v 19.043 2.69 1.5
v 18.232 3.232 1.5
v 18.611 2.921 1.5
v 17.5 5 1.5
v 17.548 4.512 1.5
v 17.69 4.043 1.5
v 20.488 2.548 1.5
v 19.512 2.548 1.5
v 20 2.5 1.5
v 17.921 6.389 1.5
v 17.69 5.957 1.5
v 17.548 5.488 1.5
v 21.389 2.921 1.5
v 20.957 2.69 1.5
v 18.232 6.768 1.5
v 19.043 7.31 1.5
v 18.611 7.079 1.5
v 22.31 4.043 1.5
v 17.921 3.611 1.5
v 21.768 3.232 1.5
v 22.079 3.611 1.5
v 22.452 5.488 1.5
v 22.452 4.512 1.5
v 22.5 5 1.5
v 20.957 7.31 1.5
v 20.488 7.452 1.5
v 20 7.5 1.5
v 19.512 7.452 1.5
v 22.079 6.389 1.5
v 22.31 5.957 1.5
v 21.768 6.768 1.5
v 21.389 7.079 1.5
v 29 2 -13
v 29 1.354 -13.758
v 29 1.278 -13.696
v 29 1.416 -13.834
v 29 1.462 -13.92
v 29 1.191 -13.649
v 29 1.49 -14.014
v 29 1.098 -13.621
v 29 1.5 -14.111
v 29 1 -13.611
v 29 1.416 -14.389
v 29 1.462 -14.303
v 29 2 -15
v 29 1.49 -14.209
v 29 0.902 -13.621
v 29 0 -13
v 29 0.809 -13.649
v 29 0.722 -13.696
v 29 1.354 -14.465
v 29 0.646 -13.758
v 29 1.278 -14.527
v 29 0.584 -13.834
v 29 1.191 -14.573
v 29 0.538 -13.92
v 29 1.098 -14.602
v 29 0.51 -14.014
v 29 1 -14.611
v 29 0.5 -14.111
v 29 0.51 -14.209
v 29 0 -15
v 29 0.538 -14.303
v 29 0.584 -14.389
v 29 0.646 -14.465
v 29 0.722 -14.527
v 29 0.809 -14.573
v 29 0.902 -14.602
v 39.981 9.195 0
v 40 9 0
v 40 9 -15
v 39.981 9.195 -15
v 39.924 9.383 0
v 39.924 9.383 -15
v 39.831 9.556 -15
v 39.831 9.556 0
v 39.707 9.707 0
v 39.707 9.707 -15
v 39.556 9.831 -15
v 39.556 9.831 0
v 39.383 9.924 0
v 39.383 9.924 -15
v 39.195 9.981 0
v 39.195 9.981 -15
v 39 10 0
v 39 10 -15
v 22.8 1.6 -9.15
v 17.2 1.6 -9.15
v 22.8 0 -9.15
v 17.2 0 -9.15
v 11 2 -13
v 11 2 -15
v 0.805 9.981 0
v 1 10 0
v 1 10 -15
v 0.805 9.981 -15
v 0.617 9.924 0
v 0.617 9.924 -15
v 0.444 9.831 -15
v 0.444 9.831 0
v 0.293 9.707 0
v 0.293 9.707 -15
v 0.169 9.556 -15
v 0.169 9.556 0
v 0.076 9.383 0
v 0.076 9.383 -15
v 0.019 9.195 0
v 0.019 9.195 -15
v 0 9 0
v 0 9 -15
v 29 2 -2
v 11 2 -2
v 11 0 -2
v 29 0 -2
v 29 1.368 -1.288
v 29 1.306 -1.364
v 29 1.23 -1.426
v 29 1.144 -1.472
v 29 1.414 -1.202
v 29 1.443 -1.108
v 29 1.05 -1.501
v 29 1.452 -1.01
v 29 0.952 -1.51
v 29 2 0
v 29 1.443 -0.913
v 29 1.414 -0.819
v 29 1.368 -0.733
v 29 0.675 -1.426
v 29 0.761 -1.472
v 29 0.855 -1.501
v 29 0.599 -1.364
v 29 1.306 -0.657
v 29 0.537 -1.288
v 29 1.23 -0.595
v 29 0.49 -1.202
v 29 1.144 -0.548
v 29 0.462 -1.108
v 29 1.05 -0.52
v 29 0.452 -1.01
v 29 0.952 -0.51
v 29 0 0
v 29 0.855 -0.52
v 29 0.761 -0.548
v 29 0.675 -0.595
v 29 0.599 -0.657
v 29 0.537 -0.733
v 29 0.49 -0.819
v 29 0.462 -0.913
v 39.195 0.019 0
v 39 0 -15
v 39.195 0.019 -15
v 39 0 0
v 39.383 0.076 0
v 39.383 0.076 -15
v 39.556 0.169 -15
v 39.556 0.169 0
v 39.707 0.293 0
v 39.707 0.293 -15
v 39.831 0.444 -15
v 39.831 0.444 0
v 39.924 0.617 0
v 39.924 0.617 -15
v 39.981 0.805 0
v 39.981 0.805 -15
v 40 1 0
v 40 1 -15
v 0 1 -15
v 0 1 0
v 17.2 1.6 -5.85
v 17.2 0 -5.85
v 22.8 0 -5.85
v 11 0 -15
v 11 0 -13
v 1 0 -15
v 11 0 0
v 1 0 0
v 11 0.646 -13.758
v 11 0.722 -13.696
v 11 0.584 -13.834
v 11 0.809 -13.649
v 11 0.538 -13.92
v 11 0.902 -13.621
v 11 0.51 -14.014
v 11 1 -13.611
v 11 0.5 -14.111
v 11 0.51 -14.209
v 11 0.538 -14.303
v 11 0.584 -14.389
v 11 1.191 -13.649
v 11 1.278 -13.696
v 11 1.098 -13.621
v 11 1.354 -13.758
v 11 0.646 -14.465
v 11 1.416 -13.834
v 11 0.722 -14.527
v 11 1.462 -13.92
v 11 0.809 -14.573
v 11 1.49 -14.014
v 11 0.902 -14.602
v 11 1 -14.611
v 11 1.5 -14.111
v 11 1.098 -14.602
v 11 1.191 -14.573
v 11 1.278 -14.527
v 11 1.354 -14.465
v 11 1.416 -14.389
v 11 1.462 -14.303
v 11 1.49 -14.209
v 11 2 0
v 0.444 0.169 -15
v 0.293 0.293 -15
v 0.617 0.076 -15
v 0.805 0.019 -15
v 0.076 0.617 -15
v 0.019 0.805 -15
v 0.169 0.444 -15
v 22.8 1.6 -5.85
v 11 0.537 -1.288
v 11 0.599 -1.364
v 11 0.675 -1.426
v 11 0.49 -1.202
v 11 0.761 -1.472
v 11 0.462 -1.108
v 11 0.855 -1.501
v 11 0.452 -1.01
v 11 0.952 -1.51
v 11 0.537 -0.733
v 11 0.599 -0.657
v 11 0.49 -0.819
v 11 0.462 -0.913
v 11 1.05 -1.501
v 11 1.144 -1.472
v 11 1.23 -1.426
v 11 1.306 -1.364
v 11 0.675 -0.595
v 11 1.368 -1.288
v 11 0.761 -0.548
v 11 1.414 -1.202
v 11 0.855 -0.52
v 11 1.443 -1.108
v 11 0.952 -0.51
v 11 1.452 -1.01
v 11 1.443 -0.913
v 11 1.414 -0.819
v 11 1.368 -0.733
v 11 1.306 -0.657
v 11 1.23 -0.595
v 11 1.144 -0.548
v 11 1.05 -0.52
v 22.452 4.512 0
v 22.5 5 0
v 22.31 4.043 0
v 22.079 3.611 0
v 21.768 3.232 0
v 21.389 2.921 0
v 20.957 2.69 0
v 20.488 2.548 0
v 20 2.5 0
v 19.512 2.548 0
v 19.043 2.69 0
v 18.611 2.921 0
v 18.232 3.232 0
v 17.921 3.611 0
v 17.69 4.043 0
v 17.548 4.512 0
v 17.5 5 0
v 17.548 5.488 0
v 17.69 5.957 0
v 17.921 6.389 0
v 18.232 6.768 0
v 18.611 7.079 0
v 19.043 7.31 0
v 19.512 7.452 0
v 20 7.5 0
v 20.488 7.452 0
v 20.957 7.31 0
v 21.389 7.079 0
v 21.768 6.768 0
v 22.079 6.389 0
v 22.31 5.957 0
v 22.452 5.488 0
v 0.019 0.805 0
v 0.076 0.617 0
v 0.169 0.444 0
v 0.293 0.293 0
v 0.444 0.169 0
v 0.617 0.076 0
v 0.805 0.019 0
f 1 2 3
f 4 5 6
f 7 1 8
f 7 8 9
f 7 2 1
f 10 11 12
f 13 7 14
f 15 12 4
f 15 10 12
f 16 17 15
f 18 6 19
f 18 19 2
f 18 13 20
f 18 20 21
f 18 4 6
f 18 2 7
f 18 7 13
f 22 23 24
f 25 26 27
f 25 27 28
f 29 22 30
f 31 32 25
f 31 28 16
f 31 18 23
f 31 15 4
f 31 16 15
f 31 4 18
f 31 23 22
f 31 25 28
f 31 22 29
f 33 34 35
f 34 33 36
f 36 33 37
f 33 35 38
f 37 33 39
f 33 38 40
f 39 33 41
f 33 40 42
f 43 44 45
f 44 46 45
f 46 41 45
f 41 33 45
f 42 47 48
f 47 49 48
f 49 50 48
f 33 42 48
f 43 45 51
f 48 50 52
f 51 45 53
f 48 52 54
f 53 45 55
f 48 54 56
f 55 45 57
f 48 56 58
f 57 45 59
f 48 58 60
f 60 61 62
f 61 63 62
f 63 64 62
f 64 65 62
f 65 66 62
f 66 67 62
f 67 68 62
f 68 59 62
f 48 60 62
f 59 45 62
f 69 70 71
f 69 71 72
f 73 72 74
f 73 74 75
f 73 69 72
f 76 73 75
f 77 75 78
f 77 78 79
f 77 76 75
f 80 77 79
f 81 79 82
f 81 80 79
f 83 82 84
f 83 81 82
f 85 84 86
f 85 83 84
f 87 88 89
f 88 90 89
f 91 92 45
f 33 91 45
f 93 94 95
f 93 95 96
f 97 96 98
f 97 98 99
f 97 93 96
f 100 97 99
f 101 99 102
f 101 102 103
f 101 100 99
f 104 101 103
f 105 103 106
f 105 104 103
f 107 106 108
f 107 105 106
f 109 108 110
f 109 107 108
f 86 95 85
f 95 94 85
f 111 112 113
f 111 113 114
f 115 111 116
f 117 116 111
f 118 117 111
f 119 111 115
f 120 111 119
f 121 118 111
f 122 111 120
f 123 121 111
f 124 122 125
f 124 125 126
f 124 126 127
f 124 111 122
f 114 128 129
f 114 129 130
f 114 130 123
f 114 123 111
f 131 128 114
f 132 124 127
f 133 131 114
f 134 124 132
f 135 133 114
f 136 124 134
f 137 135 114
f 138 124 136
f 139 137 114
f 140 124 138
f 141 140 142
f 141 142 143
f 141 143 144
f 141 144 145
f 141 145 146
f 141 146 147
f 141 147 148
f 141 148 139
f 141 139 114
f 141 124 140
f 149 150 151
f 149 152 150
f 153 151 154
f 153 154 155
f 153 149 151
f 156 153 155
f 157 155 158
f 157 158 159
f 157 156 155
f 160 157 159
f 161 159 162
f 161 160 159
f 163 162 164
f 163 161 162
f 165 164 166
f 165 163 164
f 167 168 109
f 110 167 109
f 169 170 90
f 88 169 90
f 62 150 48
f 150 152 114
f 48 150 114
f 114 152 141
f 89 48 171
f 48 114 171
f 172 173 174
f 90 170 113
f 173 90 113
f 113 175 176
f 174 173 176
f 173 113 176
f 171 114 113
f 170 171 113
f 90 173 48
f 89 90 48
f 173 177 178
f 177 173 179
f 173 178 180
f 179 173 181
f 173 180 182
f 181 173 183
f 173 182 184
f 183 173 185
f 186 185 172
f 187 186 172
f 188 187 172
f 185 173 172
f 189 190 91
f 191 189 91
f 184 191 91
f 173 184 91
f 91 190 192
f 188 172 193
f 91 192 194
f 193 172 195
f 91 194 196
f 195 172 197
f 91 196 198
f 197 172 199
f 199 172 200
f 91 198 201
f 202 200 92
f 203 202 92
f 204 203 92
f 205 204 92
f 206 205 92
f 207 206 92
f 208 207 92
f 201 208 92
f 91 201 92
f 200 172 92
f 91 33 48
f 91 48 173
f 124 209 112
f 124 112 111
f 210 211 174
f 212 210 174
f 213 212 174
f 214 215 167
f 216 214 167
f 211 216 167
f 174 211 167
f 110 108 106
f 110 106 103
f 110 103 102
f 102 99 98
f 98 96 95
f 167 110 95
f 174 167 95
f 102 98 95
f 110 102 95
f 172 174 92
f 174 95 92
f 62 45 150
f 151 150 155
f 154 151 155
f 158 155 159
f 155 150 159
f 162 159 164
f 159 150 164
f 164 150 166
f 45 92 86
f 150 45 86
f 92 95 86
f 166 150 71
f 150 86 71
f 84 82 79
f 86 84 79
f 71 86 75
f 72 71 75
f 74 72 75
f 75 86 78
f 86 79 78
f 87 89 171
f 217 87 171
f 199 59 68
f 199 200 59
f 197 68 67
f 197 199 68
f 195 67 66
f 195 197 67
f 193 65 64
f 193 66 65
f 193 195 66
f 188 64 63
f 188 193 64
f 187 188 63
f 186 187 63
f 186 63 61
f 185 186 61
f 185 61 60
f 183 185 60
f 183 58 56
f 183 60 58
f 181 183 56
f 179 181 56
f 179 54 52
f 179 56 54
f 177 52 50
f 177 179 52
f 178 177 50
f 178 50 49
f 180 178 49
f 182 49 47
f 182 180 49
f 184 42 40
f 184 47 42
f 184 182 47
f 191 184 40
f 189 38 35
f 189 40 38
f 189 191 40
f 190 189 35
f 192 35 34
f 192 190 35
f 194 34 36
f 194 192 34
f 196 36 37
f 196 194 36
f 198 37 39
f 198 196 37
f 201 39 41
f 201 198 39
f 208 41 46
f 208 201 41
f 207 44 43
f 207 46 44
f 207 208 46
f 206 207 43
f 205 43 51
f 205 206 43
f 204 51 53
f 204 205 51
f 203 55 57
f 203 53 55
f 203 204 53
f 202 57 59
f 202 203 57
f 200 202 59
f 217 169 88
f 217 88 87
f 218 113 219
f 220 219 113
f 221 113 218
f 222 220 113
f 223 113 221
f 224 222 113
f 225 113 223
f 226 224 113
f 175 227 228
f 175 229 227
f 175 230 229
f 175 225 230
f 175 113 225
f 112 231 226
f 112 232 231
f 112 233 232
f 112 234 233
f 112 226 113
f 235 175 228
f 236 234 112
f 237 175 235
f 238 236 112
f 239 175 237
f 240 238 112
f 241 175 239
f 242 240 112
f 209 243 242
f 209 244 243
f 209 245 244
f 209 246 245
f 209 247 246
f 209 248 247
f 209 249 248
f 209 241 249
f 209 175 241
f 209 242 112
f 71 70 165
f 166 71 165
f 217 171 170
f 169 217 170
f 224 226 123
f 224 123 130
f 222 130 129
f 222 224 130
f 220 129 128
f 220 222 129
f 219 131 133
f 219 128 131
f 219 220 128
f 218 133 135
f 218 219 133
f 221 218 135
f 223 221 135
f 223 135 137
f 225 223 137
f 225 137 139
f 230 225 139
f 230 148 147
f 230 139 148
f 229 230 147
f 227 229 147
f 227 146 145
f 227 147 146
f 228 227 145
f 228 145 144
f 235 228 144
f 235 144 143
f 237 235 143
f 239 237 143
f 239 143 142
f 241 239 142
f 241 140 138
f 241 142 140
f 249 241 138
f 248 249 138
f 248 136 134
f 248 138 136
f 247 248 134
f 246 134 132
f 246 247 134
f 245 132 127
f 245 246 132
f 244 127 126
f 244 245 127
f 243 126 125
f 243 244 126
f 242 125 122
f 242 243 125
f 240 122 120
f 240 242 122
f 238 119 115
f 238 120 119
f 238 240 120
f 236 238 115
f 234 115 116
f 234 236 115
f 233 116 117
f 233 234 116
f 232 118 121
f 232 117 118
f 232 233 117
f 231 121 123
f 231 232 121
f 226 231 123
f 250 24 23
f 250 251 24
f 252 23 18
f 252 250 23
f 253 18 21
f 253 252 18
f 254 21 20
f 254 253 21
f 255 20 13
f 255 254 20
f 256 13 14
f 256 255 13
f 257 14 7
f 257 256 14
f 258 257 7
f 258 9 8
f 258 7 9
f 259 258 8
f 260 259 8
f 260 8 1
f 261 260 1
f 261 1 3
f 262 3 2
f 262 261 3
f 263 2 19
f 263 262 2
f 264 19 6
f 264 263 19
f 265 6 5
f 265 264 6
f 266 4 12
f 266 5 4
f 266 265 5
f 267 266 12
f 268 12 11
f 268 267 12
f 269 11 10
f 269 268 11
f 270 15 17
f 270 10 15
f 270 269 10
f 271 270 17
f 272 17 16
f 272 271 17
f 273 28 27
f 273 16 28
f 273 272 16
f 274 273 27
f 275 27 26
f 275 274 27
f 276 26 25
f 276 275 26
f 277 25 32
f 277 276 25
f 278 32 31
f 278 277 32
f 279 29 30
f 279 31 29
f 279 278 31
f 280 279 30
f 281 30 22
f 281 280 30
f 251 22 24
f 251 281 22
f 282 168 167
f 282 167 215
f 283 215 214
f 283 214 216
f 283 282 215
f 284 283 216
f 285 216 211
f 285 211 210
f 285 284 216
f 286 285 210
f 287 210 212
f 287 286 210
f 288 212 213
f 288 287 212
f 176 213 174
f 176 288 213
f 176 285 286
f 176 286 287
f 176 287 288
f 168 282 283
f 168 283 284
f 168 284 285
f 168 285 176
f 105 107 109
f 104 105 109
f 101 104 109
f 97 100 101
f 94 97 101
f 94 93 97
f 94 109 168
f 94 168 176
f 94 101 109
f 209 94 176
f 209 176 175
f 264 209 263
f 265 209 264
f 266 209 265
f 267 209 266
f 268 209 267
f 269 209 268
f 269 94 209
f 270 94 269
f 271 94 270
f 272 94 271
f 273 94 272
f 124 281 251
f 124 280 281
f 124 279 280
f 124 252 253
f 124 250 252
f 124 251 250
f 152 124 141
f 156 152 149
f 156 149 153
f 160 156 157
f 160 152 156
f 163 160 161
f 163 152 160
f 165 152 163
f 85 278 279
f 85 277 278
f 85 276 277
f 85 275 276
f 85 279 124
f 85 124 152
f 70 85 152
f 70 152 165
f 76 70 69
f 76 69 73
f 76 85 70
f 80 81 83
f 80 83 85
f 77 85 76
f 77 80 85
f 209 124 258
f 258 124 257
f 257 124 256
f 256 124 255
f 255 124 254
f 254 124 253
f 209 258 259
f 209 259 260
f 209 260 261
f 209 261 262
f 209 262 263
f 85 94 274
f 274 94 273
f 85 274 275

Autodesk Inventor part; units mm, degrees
ref_plane "YZ Plane" through (0, 0, 0) normal (1, 0, 0) x (0, 1, 0)
ref_plane "XZ Plane" through (0, 0, 0) normal (0, 1, 0) x (-1, 0, 0)
ref_plane "XY Plane" through (0, 0, 0) normal (0, 0, 1) x (1, 0, 0)
sketch "Sketch1" plane through (0, 0, 0) normal (0, 0, 1) x (1, 0, 0)
  line L0 (0, 1) -> (0, 9)
  line L1 (1, 10) -> (39, 10)
  line L2 (40, 9) -> (40, 1)
  line L3 (39, 0) -> (1, 0)
  arc A0 (1, 10) -> (0, 9) centre (1, 9) ccw
  arc A1 (40, 9) -> (39, 10) centre (39, 9) ccw
  arc A2 (39, 0) -> (40, 1) centre (39, 1) ccw
  arc A3 (0, 1) -> (1, 0) centre (1, 1) ccw
  point P0 (0, 0)
  point P1 (0, 10)
  point P2 (40, 10)
  point P3 (40, 0)
  dimension "d0" = 10
  dimension "d1" = 40
  dimension "d4" = 1
extrude "Extrusion1" add sketch "Sketch1" against normal blind 15
sketch "Sketch2" plane through (1, 0, 0) normal (0, -1, 0) x (1, 0, 0)
  line L0 (0, 0) -> (38, 0) projected
  line L1 (0, 0) -> (0, -15) projected
  line L2 (38, -15) -> (0, -15) projected
  line L3 (38, 0) -> (38, -15) projected
  line L4 (0, 0) -> (38, 0) projected
  line L5 (0, 0) -> (0, -15) projected
  line L6 (38, -15) -> (0, -15) projected
  line L7 (38, 0) -> (38, -15) projected
  line L8 (0, 0) -> (38, 0) projected
  line L9 (38, -15) -> (0, -15) projected
  line L10 (0, 0) -> (0, -15) projected
  line L11 (38, 0) -> (38, -15) projected
  line L12 (16.2, -5.85) -> (16.2, -9.15)
  line L13 (16.2, -9.15) -> (21.8, -9.15)
  line L14 (21.8, -9.15) -> (21.8, -5.85)
  line L15 (21.8, -5.85) -> (16.2, -5.85)
  point P0 (-1, 0)
  point P1 (16.2, -7.5)
  dimension "d8" = 3.3
  dimension "d9" = 5.6
  dimension "d10" = 16.2
  dimension "d11" = 5.85
extrude "Extrusion2" cut sketch "Sketch2" against normal blind 1.6 contours L15 L14 L13 L12
sketch "Sketch3" plane through (0, 0, 0) normal (0, 0, 1) x (1, 0, 0)
  line L0 (40, 1) -> (40, 9) projected
  arc A0 (40, 9) -> (39, 10) centre (39, 9) ccw projected
  line L1 (39, 10) -> (1, 10) projected
  arc A1 (1, 10) -> (0, 9) centre (1, 9) ccw projected
  line L2 (0, 9) -> (0, 1) projected
  arc A2 (0, 1) -> (1, 0) centre (1, 1) ccw projected
  line L3 (1, 0) -> (39, 0) projected
  arc A3 (39, 0) -> (40, 1) centre (39, 1) ccw projected
  circle A4 centre (20, 5) radius 2.5
  point P0 (0, 0)
  dimension "d14" = 5
extrude "Extrusion3" add sketch "Sketch3" along normal blind 1.5 contours A4
sketch "Sketch4" plane through (0, 0, 0) normal (0, 0, 1) x (1, 0, 0)
  line L0 (17.2, 0) -> (22.8, 0) projected
  line L1 (20, 0) -> (11, 0)
  line L2 (1, 0) -> (39, 0) projected
  line L3 (11, 0) -> (11, 2)
  line L4 (11, 2) -> (29, 2)
  line L5 (29, 2) -> (29, 0)
  line L6 (29, 0) -> (20, 0)
  point P0 (0, 0)
  point P1 (29, 0)
  dimension "d17" = 9
  dimension "d18" = 2
  dimension "d19" = 18
extrude "Extrusion4" cut sketch "Sketch4" against normal blind 2
sketch "Sketch5" plane through (0, 0, -15) normal (0, 0, -1) x (-1, 0, 0)
  line L0 (-11, 2) -> (-29, 2) projected
  line L1 (-11, 0) -> (-11, 2) projected
  line L2 (-39, 0) -> (-1, 0) projected
  line L3 (-29, 2) -> (-29, 0) projected
  point P0 (0, 0)
extrude "Extrusion5" cut sketch "Sketch5" against normal blind 2
sketch "Sketch6" plane through (11, 0, 0) normal (1, 0, 0) x (0, 0, -1)
  circle A0 centre (1.0103, 0.9523) radius 0.5
  point P0 (0, 0)
  dimension "d24" = 1
extrude "Extrusion6" add sketch "Sketch6" along normal blind 18
sketch "Sketch7" plane through (11, 0, -15) normal (1, 0, 0) x (0, 0, -1)
  circle A0 centre (-0.8887, 1) radius 0.5
  point P0 (-15, 0)
  dimension "d27" = 1
extrude "Extrusion7" add sketch "Sketch7" along normal blind 18
equation "\"BendRadius\" = Thickness"
equation "\"BendReliefWidth\" = Thickness"
equation "\"BendReliefDepth\" = 0.5 * Thickness"
equation "\"CornerReliefSize\" = 4 * Thickness"
equation "\"MinimumRemnant\" = 2 * Thickness"
equation "\"TransitionRadius\" = BendRadius"
equation "\"JacobiRadiusSize\" = BendRadius"
equation "\"GapSize\" = Thickness"
equation "\"Thickness\" = 3.048"
properties part number "Caja" material "Rubber, Silicone"
